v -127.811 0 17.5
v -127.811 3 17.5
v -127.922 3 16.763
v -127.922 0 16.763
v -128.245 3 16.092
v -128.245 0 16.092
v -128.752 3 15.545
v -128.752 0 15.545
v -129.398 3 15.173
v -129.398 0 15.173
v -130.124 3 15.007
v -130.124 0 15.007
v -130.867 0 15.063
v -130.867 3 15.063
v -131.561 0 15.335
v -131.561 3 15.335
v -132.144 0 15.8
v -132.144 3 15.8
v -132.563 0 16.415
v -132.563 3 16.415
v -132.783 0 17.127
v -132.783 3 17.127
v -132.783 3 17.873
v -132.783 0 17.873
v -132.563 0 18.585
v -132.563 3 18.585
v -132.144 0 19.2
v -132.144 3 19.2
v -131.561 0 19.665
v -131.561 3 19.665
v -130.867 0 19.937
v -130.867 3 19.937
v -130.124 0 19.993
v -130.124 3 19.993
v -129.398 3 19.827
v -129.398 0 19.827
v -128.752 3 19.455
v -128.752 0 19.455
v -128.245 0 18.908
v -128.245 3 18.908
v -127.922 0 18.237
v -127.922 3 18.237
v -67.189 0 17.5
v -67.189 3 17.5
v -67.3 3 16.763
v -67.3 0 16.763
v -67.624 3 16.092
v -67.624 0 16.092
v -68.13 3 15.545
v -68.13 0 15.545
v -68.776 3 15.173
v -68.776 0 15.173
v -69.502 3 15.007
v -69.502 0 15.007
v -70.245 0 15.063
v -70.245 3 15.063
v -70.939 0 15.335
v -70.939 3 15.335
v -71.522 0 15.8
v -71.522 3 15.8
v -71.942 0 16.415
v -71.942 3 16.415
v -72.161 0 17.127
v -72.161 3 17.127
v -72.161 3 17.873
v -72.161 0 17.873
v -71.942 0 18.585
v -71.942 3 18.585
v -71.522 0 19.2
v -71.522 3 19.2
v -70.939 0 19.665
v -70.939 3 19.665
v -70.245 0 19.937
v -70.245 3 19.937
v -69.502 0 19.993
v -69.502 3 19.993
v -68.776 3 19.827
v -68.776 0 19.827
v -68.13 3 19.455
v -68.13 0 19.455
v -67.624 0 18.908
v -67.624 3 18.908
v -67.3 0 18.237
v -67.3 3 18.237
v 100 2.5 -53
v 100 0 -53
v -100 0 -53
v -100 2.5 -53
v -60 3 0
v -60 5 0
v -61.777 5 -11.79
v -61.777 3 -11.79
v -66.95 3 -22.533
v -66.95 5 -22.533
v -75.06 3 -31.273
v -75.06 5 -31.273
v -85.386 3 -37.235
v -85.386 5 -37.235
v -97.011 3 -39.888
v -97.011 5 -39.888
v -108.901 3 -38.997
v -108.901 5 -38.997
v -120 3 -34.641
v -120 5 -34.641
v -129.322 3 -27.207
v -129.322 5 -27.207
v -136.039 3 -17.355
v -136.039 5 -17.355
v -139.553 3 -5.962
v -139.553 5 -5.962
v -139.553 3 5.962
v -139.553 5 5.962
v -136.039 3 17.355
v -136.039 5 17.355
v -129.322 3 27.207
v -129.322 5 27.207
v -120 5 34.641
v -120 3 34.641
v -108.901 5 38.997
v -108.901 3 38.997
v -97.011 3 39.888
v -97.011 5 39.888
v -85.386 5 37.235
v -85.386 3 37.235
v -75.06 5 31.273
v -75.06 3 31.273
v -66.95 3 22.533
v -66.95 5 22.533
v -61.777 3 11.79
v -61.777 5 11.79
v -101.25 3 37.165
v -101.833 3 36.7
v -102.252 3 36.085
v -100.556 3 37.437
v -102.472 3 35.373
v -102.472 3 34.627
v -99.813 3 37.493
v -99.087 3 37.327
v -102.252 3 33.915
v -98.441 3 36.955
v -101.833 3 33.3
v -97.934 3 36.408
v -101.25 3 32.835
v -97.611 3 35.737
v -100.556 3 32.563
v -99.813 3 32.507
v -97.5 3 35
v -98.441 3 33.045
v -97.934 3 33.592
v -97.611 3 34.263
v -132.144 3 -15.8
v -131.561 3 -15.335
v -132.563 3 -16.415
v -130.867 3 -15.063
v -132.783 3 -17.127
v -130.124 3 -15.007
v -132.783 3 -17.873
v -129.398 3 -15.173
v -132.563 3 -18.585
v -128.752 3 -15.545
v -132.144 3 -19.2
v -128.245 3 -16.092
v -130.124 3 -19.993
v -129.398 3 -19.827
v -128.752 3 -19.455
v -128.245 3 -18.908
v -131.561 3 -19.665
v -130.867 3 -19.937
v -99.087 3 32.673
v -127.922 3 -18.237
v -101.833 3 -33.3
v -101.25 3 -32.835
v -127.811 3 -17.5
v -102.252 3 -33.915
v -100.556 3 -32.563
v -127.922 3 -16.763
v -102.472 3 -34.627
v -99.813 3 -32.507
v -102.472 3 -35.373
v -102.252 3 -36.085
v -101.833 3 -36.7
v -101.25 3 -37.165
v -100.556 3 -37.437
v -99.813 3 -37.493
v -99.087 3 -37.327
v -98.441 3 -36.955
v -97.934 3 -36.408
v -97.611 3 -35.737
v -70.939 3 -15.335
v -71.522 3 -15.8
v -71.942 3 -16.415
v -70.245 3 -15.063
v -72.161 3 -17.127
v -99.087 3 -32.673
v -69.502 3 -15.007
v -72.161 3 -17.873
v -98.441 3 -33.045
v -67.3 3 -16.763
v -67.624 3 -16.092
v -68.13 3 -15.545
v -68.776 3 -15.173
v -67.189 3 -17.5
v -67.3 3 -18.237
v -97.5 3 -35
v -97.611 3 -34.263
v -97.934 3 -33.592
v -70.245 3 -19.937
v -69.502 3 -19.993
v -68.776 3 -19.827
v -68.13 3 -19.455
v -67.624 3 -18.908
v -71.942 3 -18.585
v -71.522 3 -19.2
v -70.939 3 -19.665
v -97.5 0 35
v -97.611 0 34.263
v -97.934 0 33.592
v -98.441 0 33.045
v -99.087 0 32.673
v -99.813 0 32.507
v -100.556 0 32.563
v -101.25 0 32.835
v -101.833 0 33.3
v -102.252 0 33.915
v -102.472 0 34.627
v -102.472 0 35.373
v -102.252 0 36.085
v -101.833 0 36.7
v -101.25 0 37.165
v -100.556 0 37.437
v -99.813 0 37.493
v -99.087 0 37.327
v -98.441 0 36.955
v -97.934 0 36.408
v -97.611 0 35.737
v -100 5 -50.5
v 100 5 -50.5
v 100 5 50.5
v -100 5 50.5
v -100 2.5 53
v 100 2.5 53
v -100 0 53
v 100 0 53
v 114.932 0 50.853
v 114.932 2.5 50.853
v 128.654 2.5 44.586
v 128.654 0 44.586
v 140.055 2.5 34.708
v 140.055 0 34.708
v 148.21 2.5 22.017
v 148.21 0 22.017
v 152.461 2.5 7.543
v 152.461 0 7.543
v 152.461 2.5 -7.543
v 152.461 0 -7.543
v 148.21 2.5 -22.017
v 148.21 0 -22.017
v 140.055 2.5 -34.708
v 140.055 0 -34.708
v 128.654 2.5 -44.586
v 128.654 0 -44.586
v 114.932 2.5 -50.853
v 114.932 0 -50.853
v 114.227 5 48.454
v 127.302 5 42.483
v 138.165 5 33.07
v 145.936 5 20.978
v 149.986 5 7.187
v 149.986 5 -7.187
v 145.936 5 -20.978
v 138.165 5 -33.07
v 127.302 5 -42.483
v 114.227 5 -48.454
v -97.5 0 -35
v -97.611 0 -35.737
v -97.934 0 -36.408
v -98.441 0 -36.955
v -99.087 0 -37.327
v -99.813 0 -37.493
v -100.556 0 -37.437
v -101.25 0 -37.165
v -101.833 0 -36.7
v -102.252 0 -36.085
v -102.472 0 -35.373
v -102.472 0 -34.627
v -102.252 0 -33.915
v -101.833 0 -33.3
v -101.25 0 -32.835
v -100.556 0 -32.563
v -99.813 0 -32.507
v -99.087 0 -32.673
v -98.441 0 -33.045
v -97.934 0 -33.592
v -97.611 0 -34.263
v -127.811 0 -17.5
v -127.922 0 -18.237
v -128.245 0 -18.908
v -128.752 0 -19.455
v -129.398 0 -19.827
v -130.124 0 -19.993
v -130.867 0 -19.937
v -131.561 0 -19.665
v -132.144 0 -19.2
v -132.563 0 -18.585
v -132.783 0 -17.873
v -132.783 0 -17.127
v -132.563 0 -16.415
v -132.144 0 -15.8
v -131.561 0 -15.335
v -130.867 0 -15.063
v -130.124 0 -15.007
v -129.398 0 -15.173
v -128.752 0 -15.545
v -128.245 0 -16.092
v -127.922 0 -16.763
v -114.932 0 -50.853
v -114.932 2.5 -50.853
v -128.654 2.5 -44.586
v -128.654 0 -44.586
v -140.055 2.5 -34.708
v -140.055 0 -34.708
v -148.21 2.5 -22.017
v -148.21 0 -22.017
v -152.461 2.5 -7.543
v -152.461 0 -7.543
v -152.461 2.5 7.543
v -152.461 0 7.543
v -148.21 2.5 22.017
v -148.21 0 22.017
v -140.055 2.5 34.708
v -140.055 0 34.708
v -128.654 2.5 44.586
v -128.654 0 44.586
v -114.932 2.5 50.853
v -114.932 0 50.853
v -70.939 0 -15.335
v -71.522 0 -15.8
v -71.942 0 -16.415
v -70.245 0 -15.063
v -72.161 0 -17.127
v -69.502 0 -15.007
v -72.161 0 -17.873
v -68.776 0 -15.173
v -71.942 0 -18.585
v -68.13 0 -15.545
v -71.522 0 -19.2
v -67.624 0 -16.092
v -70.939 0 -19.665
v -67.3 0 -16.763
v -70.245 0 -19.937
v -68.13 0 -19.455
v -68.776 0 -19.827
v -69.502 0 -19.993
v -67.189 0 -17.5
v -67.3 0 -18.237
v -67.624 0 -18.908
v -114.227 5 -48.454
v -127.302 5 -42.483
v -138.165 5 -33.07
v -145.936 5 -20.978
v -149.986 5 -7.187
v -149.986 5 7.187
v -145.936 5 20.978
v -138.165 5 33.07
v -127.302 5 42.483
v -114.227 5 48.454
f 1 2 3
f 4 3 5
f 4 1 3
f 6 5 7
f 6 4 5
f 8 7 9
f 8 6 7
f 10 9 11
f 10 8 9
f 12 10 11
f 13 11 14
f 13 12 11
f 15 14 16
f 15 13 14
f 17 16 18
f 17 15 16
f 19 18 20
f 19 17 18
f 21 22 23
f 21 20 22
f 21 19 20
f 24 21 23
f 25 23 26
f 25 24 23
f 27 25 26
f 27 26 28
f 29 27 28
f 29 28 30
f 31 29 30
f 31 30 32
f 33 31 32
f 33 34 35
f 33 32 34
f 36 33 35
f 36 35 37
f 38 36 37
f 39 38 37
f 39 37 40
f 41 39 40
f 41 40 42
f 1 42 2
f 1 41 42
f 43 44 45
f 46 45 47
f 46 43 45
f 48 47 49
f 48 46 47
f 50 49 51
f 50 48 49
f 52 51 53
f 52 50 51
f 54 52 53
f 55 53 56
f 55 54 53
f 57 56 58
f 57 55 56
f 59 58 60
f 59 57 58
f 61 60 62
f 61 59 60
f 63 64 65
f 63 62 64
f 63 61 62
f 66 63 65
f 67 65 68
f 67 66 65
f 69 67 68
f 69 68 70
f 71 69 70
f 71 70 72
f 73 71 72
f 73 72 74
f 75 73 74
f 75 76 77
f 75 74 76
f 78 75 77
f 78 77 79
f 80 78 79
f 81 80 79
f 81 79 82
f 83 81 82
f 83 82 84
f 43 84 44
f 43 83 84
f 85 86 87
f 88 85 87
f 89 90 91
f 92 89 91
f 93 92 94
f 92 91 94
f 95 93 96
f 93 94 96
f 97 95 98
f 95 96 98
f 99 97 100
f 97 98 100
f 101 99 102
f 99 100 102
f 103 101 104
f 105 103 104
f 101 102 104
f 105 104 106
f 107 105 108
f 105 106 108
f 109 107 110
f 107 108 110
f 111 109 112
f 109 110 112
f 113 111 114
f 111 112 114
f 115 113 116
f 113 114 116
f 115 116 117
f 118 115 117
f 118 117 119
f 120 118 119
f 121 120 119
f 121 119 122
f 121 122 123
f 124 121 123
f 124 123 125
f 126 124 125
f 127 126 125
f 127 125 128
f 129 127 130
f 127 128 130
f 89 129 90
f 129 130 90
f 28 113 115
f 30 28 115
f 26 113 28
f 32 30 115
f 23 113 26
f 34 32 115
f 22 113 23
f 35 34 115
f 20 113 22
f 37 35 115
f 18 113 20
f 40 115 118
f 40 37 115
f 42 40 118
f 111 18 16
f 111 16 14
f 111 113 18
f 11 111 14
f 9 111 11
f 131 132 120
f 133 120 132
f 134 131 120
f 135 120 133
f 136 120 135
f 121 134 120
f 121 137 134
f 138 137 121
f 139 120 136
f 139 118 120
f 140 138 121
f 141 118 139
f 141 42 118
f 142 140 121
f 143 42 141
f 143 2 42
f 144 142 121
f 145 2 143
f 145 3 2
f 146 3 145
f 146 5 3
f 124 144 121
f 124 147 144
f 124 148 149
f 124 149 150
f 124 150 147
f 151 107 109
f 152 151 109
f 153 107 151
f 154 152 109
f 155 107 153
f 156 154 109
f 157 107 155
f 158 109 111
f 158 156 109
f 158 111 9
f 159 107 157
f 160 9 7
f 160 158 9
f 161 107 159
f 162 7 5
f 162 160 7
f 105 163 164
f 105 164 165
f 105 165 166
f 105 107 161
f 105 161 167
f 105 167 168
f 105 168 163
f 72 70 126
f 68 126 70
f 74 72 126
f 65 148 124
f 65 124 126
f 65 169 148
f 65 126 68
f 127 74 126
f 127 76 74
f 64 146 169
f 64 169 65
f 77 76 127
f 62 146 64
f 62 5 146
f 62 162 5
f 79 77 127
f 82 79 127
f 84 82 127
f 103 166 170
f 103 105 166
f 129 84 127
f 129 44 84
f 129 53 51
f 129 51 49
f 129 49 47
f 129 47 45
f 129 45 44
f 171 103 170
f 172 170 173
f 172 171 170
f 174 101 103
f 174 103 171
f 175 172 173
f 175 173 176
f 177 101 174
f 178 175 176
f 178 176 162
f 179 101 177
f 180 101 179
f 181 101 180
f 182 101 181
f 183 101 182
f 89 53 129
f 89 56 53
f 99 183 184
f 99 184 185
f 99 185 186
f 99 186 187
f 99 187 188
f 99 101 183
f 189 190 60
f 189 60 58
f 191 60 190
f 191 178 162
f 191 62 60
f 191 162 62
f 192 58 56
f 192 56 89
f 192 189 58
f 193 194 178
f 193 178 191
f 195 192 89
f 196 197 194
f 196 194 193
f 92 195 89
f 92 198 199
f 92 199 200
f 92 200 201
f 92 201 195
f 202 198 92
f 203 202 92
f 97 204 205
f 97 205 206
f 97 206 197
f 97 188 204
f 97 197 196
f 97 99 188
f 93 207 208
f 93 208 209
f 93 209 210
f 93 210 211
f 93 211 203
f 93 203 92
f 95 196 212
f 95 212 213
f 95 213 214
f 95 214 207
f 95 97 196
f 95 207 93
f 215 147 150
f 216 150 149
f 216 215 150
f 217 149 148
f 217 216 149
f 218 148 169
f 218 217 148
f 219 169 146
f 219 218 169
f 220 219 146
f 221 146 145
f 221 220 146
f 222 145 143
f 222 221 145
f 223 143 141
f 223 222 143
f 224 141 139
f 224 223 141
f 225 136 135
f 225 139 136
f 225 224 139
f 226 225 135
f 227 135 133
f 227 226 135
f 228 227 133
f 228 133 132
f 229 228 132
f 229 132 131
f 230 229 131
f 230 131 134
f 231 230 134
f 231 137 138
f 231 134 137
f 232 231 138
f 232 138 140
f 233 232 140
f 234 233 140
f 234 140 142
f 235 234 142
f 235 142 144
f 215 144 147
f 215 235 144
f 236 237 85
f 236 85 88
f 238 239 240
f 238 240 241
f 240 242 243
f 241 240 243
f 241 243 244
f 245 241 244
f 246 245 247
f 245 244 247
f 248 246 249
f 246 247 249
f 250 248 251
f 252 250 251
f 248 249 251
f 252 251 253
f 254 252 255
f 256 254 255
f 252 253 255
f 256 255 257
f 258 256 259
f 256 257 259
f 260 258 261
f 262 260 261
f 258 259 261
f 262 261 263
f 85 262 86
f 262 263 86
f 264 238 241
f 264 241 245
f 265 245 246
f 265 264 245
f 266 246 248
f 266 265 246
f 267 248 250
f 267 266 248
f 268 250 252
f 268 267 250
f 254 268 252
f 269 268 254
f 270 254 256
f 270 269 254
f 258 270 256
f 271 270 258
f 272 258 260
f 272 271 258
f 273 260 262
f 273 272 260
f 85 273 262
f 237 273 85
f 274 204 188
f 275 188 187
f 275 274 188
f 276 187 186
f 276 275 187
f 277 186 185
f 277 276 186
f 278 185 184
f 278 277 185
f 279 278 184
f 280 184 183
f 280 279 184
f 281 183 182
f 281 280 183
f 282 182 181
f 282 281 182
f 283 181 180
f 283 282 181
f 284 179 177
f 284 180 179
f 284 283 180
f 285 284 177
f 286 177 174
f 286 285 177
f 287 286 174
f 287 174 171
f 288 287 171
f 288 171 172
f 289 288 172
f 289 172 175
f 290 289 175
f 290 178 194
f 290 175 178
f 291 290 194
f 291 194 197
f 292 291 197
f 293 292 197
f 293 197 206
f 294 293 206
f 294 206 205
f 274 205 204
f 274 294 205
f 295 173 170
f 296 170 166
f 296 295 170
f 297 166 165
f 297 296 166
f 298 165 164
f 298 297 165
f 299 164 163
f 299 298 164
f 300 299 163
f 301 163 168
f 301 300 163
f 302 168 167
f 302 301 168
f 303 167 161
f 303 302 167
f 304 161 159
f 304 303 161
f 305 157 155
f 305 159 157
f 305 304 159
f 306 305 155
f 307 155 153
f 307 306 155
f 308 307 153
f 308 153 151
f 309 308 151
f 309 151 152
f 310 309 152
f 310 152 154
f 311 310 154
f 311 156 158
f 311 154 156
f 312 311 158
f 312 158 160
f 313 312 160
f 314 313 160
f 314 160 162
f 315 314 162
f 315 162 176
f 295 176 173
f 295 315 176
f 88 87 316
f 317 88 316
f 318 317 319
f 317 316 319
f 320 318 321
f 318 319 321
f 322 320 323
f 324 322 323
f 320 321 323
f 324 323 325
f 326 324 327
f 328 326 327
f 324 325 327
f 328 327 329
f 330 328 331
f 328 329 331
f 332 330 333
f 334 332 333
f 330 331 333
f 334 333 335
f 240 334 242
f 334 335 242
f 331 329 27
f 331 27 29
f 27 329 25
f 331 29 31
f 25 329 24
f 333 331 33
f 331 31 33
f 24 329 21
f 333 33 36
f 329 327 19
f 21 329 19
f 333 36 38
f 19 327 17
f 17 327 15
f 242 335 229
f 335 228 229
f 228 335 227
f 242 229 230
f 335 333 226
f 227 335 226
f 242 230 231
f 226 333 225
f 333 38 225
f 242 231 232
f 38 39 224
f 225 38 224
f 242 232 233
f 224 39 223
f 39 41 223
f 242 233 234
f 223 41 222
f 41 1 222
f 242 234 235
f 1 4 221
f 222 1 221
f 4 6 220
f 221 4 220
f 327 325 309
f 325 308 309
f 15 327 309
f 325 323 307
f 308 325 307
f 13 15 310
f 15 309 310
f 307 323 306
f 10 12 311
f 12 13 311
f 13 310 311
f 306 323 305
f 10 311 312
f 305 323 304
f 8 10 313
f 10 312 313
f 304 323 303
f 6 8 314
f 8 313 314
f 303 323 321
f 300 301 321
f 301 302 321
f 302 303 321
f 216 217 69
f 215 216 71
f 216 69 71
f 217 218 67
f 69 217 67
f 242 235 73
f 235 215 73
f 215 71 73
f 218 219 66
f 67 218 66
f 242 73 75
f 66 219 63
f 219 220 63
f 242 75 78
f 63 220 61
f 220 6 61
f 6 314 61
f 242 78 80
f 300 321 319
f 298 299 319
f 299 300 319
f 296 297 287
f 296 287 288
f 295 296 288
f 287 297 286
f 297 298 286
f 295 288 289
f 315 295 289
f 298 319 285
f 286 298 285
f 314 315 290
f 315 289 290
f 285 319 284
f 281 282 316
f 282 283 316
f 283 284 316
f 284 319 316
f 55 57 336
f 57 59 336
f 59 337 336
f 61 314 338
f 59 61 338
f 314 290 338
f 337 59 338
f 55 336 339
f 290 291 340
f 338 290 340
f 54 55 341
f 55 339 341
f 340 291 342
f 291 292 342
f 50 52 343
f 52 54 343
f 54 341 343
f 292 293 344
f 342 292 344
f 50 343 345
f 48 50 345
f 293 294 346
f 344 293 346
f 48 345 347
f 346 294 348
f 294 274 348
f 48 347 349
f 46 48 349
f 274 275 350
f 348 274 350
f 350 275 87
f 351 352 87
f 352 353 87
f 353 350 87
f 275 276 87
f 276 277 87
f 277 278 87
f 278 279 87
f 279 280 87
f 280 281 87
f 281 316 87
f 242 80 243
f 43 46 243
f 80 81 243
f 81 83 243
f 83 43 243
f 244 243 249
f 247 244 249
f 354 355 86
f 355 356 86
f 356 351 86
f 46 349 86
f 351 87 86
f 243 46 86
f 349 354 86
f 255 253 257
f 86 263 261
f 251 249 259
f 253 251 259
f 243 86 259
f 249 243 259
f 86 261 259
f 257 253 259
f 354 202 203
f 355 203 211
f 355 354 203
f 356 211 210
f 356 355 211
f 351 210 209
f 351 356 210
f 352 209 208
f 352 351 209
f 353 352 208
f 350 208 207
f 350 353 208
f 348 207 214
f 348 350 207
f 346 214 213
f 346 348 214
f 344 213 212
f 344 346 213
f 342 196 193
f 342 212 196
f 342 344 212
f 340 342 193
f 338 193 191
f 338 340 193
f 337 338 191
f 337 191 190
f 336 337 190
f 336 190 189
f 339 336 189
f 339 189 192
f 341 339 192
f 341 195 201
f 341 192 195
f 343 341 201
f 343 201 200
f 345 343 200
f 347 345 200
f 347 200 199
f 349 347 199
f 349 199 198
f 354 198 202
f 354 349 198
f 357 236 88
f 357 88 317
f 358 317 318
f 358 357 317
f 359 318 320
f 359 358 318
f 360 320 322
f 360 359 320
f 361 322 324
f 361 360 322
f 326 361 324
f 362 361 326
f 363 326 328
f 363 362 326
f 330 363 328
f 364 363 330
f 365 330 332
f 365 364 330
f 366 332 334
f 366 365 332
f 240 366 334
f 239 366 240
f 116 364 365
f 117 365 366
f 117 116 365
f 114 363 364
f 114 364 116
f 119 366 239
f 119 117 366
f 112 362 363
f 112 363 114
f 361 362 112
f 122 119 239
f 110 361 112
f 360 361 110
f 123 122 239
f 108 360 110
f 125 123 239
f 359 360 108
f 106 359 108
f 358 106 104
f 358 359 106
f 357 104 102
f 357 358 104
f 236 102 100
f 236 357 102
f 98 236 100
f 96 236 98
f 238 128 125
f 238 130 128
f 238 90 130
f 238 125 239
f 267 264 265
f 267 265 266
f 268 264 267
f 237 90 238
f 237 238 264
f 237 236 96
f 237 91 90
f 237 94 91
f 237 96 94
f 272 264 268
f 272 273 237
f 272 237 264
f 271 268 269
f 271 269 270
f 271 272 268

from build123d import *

# Parameters (mm, degrees)
SKETCH1_R           = 2.5
BOSS_EXTRUDE1_DEPTH = 5
SKETCH2_R           = 40
CUT_EXTRUDE1_DEPTH  = 2
CHAMFER1_SIZE       = 2.5


with BuildPart() as part:
    # Sketch1 → Boss-Extrude1 (new body)
    with BuildSketch(Plane(origin=(0, 0, 0), x_dir=(1, 0, 0), z_dir=(0, 1, 0))):
        with BuildLine():
            Line((-100, -53), (100, -53))
            ThreePointArc((100, -53), (153, 0), (100, 53))
            Line((100, 53), (-100, 53))
            ThreePointArc((-100, 53), (-153, 0), (-100, -53))
        make_face()
        with Locations((-100, -35)):
            Circle(SKETCH1_R, mode=Mode.SUBTRACT)
        with Locations((-100, 35)):
            Circle(SKETCH1_R, mode=Mode.SUBTRACT)
        with Locations((-69.689110868, 17.5)):
            Circle(SKETCH1_R, mode=Mode.SUBTRACT)
        with Locations((-69.689110868, -17.5)):
            Circle(SKETCH1_R, mode=Mode.SUBTRACT)
        with Locations((-130.310889132, 17.5)):
            Circle(SKETCH1_R, mode=Mode.SUBTRACT)
        with Locations((-130.310889132, -17.5)):
            Circle(SKETCH1_R, mode=Mode.SUBTRACT)
    extrude(amount=BOSS_EXTRUDE1_DEPTH)

    # Sketch2 → Cut-Extrude1 (cut)
    with BuildSketch(Plane(origin=(0, 5, 0), x_dir=(1, 0, 0), z_dir=(0, 1, 0))):
        with Locations((-100, 0)):
            Circle(SKETCH2_R)
    extrude(amount=-CUT_EXTRUDE1_DEPTH, mode=Mode.SUBTRACT)

    # Chamfer1
    chamfer1_edges = [part.edges().sort_by_distance(p)[0] for p in [
        (-153, 5, 0),
        (0, 5, 53),
        (153, 5, 0),
        (0, 5, -53),
    ]]
    chamfer(chamfer1_edges, length=CHAMFER1_SIZE)


solid = part.part
